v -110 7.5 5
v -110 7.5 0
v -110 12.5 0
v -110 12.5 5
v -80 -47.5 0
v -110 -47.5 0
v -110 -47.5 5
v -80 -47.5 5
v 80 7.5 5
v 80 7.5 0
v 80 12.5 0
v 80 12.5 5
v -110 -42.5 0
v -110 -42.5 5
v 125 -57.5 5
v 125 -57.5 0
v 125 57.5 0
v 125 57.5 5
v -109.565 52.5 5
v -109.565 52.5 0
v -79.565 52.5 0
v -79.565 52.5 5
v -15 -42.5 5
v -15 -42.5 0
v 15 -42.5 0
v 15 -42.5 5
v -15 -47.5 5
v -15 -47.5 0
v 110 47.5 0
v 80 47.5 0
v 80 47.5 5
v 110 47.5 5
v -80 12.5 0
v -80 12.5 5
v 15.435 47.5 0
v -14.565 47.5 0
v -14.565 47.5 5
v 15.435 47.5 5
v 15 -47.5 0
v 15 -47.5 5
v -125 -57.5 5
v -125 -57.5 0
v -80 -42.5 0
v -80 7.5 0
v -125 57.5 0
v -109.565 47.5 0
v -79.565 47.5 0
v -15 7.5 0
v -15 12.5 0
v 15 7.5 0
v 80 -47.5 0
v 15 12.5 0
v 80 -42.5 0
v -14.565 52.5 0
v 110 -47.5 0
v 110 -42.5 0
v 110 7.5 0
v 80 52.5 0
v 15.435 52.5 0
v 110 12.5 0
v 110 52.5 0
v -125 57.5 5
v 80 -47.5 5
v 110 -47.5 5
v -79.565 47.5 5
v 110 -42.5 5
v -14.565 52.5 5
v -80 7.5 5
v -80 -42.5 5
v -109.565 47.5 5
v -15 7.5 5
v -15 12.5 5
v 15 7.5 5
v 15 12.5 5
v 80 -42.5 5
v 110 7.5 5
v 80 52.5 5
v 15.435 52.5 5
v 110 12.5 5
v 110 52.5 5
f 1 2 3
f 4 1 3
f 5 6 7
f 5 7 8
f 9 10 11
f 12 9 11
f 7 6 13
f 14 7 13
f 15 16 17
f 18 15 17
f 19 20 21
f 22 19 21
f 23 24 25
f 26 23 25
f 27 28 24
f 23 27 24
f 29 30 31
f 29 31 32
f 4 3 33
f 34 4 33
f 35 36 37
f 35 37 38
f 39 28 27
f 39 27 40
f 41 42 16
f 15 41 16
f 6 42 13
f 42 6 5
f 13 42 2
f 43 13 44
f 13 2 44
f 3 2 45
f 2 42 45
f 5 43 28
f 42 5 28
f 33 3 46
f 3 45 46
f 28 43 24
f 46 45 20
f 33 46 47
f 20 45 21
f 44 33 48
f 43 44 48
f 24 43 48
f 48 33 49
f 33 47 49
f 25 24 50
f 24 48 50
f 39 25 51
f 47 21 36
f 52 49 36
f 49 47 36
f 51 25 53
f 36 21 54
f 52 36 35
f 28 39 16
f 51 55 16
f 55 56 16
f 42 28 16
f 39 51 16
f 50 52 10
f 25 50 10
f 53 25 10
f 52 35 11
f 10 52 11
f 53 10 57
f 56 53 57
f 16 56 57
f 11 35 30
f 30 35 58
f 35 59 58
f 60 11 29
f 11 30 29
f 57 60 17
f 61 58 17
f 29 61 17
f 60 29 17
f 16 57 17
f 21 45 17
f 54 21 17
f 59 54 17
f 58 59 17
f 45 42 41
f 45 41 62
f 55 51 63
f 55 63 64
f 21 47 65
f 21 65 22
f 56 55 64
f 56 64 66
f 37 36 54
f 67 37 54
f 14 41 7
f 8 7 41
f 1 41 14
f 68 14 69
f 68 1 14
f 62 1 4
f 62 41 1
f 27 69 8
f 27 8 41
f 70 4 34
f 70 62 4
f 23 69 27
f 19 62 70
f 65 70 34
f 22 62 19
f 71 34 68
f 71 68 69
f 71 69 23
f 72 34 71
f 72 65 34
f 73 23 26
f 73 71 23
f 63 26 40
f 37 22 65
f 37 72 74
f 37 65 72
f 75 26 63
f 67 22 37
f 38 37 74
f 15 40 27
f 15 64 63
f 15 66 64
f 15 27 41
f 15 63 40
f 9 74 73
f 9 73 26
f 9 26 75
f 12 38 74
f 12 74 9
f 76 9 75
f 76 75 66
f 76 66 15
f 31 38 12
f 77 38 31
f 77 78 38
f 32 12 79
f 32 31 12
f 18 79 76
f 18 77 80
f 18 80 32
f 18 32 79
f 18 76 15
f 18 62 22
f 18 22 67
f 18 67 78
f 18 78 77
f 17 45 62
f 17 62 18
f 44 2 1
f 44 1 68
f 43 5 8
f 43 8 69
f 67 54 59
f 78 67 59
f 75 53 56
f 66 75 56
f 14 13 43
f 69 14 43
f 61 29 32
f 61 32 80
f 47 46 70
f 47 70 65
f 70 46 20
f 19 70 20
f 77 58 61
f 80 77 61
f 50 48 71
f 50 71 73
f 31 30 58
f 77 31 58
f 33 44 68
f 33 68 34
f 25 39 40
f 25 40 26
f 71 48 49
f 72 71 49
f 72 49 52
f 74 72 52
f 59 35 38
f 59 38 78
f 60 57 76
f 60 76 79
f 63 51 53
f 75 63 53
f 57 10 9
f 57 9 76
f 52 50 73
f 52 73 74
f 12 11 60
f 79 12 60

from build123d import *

# Parameters (mm, degrees)
SKETCH2_W           = 250
SKETCH2_H           = 115
SKETCH2_W_2         = 30
SKETCH2_H_2         = 5
BOSS_EXTRUDE1_DEPTH = 5


with BuildPart() as part:
    # Sketch2 → Boss-Extrude1 (new body)
    with BuildSketch(Plane.XY):
        Rectangle(SKETCH2_W, SKETCH2_H)
        with Locations((-94.565217391, 50)):
            Rectangle(SKETCH2_W_2, SKETCH2_H_2, mode=Mode.SUBTRACT)
        with Locations((0.434782609, 50)):
            Rectangle(SKETCH2_W_2, SKETCH2_H_2, mode=Mode.SUBTRACT)
        with Locations((95, 50)):
            Rectangle(SKETCH2_W_2, SKETCH2_H_2, mode=Mode.SUBTRACT)
        with Locations((95, 10)):
            Rectangle(SKETCH2_W_2, SKETCH2_H_2, mode=Mode.SUBTRACT)
        with Locations((0, 10)):
            Rectangle(SKETCH2_W_2, SKETCH2_H_2, mode=Mode.SUBTRACT)
        with Locations((-95, 10)):
            Rectangle(SKETCH2_W_2, SKETCH2_H_2, mode=Mode.SUBTRACT)
        with Locations((-95, -45)):
            Rectangle(SKETCH2_W_2, SKETCH2_H_2, mode=Mode.SUBTRACT)
        with Locations((0, -45)):
            Rectangle(SKETCH2_W_2, SKETCH2_H_2, mode=Mode.SUBTRACT)
        with Locations((95, -45)):
            Rectangle(SKETCH2_W_2, SKETCH2_H_2, mode=Mode.SUBTRACT)
    extrude(amount=BOSS_EXTRUDE1_DEPTH)


solid = part.part
